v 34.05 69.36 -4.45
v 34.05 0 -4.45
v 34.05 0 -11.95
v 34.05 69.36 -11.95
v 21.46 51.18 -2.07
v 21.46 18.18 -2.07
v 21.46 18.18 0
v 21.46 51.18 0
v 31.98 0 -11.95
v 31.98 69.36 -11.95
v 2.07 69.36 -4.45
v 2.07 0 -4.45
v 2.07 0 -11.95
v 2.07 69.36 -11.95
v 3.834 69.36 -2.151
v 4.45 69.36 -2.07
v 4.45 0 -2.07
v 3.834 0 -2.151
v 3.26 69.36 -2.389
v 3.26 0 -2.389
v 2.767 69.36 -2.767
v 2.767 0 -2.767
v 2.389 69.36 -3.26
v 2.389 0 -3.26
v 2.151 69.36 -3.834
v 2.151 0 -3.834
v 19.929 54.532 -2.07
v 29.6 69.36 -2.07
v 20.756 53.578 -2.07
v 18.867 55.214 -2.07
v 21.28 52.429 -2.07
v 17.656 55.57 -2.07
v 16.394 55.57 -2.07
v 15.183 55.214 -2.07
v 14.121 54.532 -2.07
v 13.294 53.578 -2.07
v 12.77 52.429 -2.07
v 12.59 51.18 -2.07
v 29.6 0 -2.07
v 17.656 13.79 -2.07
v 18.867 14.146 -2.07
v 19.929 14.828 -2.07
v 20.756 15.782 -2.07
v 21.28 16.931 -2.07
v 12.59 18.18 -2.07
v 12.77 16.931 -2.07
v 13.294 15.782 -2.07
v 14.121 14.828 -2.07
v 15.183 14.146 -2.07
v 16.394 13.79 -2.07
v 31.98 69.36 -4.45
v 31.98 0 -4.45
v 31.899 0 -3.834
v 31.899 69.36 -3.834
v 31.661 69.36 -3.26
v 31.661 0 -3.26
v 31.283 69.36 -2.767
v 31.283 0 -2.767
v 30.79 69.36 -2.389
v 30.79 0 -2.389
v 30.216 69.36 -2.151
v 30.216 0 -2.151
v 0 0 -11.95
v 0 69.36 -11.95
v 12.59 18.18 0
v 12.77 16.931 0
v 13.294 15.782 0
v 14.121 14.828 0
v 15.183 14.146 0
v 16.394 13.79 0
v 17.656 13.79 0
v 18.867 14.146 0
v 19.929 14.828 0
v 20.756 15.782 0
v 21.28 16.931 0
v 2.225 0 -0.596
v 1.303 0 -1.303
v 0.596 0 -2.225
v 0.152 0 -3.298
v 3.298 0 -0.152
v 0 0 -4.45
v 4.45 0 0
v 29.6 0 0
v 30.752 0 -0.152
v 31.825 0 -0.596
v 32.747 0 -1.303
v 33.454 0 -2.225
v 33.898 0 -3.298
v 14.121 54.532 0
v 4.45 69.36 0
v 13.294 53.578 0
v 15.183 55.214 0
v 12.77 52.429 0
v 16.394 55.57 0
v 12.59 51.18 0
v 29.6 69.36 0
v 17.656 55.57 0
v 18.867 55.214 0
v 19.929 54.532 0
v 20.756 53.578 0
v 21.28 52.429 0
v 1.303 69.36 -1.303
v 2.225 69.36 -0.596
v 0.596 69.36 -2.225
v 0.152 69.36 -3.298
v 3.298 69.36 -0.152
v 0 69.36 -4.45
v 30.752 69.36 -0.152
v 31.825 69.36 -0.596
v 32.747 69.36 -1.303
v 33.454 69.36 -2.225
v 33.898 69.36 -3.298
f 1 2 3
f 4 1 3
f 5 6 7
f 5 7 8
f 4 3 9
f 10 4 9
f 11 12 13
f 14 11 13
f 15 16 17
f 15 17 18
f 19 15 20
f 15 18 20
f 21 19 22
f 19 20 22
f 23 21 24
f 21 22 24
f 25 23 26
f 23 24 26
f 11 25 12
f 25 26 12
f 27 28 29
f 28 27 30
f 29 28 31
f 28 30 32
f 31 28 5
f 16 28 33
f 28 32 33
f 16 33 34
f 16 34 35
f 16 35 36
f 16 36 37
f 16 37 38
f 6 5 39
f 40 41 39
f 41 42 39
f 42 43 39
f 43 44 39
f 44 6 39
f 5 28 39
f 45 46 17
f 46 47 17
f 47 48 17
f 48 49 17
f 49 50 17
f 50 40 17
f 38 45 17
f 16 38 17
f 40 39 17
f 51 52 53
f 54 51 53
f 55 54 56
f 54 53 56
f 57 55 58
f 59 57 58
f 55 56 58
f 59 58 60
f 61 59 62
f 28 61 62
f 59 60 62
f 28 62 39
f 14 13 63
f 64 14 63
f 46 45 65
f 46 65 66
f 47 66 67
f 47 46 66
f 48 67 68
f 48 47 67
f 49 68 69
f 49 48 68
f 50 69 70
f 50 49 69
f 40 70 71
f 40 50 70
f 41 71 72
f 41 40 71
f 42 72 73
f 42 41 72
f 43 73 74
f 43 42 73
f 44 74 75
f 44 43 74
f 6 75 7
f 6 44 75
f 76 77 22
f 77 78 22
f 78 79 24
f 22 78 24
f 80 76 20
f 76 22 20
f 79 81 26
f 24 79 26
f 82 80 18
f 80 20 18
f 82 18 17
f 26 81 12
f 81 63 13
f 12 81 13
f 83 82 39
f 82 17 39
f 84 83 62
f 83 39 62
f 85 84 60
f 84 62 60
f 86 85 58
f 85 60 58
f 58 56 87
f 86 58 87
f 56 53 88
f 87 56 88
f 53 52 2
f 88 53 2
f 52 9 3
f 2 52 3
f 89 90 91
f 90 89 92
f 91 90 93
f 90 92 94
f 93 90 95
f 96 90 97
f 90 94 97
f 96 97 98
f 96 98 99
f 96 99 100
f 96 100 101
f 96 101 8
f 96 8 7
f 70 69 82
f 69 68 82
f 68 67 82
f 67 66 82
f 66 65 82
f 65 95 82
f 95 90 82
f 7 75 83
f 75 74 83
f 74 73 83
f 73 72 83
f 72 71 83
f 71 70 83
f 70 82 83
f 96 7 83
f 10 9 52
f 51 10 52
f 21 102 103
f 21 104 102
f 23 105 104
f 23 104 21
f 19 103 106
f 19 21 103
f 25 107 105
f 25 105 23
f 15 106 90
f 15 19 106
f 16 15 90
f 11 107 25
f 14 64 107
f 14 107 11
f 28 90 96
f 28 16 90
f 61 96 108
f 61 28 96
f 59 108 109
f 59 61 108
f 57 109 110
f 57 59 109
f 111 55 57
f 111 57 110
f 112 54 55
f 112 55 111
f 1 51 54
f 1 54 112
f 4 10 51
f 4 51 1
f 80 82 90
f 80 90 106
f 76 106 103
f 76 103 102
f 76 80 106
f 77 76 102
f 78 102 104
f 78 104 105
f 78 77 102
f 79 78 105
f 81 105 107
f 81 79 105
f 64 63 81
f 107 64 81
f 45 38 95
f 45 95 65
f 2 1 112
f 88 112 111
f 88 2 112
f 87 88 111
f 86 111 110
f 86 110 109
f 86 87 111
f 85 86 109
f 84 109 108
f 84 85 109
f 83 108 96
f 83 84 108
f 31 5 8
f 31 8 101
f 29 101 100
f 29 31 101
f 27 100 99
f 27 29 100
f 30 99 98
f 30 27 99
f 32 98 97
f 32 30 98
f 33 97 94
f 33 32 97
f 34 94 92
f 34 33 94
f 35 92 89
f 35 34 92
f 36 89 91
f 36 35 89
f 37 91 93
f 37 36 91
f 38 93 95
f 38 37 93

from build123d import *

# Parameters (mm, degrees)
BOSS_EXTRUDE1_DEPTH    = 69.36
CONVERT_SOLID2_DEPTH   = 69.36
CONVERT_SOLID2_2_DEPTH = 69.36
CUT_EXTRUDE1_DEPTH     = 78.896254724


# Read off the part's stored shape, not the designer's step: Convert-Solid2
with BuildPart() as part:
    # Sketch2 → Boss-Extrude1 (new body)
    with BuildSketch(Plane(origin=(0, 0, 0), x_dir=(1, 0, 0), z_dir=(0, 1, 0))):
        Polygon((0, 11.95), (0, 0), (34.05, 0), (34.05, 11.95), (31.98, 11.95), (31.98, 2.07), (2.07, 2.07), (2.07, 11.95), align=None)
    extrude(amount=BOSS_EXTRUDE1_DEPTH)

    # Convert-Solid2 outline → Convert-Solid2 (cut)
    with BuildSketch(Plane(origin=(0, 0, 0), x_dir=(1, 0, 0), z_dir=(0, 1, 0))):
        with BuildLine():
            ThreePointArc((34.05, 4.450000066), (32.746625157, 1.303374843), (29.599999934, 0))
            Line((29.599999934, 0), (34.05, 0))
            Line((34.05, 0), (34.05, 4.450000066))
        make_face()
        with BuildLine():
            Line((0, 0), (4.450000066, 0))
            ThreePointArc((4.450000066, 0), (1.303374843, 1.303374843), (0, 4.450000066))
            Line((0, 4.450000066), (0, 0))
        make_face()
    extrude(amount=CONVERT_SOLID2_DEPTH, mode=Mode.SUBTRACT)

    # Convert-Solid2 2 outline → Convert-Solid2 2 (add)
    with BuildSketch(Plane(origin=(0, 0, 0), x_dir=(1, 0, 0), z_dir=(0, 1, 0))):
        with BuildLine():
            Line((2.07, 2.07), (4.450000066, 2.07))
            ThreePointArc((4.450000066, 2.07), (2.76708588, 2.76708588), (2.07, 4.450000066))
            Line((2.07, 4.450000066), (2.07, 2.07))
        make_face()
        with BuildLine():
            ThreePointArc((31.98, 4.450000066), (31.28291412, 2.76708588), (29.599999934, 2.07))
            Line((29.599999934, 2.07), (31.98, 2.07))
            Line((31.98, 2.07), (31.98, 4.450000066))
        make_face()
    extrude(amount=CONVERT_SOLID2_2_DEPTH)

    # Sketch12 → Cut-Extrude1 (cut, through all)
    with BuildSketch(Plane(origin=(0, 0, -2.07), x_dir=(-1, 0, 0), z_dir=(0, 0, -1))):
        with BuildLine():
            Line((-21.46, 18.18), (-21.46, 51.18))
            ThreePointArc((-21.46, 51.18), (-17.025, 55.615), (-12.59, 51.18))
            Line((-12.59, 51.18), (-12.59, 18.18))
            ThreePointArc((-12.59, 18.18), (-17.025, 13.745), (-21.46, 18.18))
        make_face()
    extrude(amount=-CUT_EXTRUDE1_DEPTH, mode=Mode.SUBTRACT)


solid = part.part
